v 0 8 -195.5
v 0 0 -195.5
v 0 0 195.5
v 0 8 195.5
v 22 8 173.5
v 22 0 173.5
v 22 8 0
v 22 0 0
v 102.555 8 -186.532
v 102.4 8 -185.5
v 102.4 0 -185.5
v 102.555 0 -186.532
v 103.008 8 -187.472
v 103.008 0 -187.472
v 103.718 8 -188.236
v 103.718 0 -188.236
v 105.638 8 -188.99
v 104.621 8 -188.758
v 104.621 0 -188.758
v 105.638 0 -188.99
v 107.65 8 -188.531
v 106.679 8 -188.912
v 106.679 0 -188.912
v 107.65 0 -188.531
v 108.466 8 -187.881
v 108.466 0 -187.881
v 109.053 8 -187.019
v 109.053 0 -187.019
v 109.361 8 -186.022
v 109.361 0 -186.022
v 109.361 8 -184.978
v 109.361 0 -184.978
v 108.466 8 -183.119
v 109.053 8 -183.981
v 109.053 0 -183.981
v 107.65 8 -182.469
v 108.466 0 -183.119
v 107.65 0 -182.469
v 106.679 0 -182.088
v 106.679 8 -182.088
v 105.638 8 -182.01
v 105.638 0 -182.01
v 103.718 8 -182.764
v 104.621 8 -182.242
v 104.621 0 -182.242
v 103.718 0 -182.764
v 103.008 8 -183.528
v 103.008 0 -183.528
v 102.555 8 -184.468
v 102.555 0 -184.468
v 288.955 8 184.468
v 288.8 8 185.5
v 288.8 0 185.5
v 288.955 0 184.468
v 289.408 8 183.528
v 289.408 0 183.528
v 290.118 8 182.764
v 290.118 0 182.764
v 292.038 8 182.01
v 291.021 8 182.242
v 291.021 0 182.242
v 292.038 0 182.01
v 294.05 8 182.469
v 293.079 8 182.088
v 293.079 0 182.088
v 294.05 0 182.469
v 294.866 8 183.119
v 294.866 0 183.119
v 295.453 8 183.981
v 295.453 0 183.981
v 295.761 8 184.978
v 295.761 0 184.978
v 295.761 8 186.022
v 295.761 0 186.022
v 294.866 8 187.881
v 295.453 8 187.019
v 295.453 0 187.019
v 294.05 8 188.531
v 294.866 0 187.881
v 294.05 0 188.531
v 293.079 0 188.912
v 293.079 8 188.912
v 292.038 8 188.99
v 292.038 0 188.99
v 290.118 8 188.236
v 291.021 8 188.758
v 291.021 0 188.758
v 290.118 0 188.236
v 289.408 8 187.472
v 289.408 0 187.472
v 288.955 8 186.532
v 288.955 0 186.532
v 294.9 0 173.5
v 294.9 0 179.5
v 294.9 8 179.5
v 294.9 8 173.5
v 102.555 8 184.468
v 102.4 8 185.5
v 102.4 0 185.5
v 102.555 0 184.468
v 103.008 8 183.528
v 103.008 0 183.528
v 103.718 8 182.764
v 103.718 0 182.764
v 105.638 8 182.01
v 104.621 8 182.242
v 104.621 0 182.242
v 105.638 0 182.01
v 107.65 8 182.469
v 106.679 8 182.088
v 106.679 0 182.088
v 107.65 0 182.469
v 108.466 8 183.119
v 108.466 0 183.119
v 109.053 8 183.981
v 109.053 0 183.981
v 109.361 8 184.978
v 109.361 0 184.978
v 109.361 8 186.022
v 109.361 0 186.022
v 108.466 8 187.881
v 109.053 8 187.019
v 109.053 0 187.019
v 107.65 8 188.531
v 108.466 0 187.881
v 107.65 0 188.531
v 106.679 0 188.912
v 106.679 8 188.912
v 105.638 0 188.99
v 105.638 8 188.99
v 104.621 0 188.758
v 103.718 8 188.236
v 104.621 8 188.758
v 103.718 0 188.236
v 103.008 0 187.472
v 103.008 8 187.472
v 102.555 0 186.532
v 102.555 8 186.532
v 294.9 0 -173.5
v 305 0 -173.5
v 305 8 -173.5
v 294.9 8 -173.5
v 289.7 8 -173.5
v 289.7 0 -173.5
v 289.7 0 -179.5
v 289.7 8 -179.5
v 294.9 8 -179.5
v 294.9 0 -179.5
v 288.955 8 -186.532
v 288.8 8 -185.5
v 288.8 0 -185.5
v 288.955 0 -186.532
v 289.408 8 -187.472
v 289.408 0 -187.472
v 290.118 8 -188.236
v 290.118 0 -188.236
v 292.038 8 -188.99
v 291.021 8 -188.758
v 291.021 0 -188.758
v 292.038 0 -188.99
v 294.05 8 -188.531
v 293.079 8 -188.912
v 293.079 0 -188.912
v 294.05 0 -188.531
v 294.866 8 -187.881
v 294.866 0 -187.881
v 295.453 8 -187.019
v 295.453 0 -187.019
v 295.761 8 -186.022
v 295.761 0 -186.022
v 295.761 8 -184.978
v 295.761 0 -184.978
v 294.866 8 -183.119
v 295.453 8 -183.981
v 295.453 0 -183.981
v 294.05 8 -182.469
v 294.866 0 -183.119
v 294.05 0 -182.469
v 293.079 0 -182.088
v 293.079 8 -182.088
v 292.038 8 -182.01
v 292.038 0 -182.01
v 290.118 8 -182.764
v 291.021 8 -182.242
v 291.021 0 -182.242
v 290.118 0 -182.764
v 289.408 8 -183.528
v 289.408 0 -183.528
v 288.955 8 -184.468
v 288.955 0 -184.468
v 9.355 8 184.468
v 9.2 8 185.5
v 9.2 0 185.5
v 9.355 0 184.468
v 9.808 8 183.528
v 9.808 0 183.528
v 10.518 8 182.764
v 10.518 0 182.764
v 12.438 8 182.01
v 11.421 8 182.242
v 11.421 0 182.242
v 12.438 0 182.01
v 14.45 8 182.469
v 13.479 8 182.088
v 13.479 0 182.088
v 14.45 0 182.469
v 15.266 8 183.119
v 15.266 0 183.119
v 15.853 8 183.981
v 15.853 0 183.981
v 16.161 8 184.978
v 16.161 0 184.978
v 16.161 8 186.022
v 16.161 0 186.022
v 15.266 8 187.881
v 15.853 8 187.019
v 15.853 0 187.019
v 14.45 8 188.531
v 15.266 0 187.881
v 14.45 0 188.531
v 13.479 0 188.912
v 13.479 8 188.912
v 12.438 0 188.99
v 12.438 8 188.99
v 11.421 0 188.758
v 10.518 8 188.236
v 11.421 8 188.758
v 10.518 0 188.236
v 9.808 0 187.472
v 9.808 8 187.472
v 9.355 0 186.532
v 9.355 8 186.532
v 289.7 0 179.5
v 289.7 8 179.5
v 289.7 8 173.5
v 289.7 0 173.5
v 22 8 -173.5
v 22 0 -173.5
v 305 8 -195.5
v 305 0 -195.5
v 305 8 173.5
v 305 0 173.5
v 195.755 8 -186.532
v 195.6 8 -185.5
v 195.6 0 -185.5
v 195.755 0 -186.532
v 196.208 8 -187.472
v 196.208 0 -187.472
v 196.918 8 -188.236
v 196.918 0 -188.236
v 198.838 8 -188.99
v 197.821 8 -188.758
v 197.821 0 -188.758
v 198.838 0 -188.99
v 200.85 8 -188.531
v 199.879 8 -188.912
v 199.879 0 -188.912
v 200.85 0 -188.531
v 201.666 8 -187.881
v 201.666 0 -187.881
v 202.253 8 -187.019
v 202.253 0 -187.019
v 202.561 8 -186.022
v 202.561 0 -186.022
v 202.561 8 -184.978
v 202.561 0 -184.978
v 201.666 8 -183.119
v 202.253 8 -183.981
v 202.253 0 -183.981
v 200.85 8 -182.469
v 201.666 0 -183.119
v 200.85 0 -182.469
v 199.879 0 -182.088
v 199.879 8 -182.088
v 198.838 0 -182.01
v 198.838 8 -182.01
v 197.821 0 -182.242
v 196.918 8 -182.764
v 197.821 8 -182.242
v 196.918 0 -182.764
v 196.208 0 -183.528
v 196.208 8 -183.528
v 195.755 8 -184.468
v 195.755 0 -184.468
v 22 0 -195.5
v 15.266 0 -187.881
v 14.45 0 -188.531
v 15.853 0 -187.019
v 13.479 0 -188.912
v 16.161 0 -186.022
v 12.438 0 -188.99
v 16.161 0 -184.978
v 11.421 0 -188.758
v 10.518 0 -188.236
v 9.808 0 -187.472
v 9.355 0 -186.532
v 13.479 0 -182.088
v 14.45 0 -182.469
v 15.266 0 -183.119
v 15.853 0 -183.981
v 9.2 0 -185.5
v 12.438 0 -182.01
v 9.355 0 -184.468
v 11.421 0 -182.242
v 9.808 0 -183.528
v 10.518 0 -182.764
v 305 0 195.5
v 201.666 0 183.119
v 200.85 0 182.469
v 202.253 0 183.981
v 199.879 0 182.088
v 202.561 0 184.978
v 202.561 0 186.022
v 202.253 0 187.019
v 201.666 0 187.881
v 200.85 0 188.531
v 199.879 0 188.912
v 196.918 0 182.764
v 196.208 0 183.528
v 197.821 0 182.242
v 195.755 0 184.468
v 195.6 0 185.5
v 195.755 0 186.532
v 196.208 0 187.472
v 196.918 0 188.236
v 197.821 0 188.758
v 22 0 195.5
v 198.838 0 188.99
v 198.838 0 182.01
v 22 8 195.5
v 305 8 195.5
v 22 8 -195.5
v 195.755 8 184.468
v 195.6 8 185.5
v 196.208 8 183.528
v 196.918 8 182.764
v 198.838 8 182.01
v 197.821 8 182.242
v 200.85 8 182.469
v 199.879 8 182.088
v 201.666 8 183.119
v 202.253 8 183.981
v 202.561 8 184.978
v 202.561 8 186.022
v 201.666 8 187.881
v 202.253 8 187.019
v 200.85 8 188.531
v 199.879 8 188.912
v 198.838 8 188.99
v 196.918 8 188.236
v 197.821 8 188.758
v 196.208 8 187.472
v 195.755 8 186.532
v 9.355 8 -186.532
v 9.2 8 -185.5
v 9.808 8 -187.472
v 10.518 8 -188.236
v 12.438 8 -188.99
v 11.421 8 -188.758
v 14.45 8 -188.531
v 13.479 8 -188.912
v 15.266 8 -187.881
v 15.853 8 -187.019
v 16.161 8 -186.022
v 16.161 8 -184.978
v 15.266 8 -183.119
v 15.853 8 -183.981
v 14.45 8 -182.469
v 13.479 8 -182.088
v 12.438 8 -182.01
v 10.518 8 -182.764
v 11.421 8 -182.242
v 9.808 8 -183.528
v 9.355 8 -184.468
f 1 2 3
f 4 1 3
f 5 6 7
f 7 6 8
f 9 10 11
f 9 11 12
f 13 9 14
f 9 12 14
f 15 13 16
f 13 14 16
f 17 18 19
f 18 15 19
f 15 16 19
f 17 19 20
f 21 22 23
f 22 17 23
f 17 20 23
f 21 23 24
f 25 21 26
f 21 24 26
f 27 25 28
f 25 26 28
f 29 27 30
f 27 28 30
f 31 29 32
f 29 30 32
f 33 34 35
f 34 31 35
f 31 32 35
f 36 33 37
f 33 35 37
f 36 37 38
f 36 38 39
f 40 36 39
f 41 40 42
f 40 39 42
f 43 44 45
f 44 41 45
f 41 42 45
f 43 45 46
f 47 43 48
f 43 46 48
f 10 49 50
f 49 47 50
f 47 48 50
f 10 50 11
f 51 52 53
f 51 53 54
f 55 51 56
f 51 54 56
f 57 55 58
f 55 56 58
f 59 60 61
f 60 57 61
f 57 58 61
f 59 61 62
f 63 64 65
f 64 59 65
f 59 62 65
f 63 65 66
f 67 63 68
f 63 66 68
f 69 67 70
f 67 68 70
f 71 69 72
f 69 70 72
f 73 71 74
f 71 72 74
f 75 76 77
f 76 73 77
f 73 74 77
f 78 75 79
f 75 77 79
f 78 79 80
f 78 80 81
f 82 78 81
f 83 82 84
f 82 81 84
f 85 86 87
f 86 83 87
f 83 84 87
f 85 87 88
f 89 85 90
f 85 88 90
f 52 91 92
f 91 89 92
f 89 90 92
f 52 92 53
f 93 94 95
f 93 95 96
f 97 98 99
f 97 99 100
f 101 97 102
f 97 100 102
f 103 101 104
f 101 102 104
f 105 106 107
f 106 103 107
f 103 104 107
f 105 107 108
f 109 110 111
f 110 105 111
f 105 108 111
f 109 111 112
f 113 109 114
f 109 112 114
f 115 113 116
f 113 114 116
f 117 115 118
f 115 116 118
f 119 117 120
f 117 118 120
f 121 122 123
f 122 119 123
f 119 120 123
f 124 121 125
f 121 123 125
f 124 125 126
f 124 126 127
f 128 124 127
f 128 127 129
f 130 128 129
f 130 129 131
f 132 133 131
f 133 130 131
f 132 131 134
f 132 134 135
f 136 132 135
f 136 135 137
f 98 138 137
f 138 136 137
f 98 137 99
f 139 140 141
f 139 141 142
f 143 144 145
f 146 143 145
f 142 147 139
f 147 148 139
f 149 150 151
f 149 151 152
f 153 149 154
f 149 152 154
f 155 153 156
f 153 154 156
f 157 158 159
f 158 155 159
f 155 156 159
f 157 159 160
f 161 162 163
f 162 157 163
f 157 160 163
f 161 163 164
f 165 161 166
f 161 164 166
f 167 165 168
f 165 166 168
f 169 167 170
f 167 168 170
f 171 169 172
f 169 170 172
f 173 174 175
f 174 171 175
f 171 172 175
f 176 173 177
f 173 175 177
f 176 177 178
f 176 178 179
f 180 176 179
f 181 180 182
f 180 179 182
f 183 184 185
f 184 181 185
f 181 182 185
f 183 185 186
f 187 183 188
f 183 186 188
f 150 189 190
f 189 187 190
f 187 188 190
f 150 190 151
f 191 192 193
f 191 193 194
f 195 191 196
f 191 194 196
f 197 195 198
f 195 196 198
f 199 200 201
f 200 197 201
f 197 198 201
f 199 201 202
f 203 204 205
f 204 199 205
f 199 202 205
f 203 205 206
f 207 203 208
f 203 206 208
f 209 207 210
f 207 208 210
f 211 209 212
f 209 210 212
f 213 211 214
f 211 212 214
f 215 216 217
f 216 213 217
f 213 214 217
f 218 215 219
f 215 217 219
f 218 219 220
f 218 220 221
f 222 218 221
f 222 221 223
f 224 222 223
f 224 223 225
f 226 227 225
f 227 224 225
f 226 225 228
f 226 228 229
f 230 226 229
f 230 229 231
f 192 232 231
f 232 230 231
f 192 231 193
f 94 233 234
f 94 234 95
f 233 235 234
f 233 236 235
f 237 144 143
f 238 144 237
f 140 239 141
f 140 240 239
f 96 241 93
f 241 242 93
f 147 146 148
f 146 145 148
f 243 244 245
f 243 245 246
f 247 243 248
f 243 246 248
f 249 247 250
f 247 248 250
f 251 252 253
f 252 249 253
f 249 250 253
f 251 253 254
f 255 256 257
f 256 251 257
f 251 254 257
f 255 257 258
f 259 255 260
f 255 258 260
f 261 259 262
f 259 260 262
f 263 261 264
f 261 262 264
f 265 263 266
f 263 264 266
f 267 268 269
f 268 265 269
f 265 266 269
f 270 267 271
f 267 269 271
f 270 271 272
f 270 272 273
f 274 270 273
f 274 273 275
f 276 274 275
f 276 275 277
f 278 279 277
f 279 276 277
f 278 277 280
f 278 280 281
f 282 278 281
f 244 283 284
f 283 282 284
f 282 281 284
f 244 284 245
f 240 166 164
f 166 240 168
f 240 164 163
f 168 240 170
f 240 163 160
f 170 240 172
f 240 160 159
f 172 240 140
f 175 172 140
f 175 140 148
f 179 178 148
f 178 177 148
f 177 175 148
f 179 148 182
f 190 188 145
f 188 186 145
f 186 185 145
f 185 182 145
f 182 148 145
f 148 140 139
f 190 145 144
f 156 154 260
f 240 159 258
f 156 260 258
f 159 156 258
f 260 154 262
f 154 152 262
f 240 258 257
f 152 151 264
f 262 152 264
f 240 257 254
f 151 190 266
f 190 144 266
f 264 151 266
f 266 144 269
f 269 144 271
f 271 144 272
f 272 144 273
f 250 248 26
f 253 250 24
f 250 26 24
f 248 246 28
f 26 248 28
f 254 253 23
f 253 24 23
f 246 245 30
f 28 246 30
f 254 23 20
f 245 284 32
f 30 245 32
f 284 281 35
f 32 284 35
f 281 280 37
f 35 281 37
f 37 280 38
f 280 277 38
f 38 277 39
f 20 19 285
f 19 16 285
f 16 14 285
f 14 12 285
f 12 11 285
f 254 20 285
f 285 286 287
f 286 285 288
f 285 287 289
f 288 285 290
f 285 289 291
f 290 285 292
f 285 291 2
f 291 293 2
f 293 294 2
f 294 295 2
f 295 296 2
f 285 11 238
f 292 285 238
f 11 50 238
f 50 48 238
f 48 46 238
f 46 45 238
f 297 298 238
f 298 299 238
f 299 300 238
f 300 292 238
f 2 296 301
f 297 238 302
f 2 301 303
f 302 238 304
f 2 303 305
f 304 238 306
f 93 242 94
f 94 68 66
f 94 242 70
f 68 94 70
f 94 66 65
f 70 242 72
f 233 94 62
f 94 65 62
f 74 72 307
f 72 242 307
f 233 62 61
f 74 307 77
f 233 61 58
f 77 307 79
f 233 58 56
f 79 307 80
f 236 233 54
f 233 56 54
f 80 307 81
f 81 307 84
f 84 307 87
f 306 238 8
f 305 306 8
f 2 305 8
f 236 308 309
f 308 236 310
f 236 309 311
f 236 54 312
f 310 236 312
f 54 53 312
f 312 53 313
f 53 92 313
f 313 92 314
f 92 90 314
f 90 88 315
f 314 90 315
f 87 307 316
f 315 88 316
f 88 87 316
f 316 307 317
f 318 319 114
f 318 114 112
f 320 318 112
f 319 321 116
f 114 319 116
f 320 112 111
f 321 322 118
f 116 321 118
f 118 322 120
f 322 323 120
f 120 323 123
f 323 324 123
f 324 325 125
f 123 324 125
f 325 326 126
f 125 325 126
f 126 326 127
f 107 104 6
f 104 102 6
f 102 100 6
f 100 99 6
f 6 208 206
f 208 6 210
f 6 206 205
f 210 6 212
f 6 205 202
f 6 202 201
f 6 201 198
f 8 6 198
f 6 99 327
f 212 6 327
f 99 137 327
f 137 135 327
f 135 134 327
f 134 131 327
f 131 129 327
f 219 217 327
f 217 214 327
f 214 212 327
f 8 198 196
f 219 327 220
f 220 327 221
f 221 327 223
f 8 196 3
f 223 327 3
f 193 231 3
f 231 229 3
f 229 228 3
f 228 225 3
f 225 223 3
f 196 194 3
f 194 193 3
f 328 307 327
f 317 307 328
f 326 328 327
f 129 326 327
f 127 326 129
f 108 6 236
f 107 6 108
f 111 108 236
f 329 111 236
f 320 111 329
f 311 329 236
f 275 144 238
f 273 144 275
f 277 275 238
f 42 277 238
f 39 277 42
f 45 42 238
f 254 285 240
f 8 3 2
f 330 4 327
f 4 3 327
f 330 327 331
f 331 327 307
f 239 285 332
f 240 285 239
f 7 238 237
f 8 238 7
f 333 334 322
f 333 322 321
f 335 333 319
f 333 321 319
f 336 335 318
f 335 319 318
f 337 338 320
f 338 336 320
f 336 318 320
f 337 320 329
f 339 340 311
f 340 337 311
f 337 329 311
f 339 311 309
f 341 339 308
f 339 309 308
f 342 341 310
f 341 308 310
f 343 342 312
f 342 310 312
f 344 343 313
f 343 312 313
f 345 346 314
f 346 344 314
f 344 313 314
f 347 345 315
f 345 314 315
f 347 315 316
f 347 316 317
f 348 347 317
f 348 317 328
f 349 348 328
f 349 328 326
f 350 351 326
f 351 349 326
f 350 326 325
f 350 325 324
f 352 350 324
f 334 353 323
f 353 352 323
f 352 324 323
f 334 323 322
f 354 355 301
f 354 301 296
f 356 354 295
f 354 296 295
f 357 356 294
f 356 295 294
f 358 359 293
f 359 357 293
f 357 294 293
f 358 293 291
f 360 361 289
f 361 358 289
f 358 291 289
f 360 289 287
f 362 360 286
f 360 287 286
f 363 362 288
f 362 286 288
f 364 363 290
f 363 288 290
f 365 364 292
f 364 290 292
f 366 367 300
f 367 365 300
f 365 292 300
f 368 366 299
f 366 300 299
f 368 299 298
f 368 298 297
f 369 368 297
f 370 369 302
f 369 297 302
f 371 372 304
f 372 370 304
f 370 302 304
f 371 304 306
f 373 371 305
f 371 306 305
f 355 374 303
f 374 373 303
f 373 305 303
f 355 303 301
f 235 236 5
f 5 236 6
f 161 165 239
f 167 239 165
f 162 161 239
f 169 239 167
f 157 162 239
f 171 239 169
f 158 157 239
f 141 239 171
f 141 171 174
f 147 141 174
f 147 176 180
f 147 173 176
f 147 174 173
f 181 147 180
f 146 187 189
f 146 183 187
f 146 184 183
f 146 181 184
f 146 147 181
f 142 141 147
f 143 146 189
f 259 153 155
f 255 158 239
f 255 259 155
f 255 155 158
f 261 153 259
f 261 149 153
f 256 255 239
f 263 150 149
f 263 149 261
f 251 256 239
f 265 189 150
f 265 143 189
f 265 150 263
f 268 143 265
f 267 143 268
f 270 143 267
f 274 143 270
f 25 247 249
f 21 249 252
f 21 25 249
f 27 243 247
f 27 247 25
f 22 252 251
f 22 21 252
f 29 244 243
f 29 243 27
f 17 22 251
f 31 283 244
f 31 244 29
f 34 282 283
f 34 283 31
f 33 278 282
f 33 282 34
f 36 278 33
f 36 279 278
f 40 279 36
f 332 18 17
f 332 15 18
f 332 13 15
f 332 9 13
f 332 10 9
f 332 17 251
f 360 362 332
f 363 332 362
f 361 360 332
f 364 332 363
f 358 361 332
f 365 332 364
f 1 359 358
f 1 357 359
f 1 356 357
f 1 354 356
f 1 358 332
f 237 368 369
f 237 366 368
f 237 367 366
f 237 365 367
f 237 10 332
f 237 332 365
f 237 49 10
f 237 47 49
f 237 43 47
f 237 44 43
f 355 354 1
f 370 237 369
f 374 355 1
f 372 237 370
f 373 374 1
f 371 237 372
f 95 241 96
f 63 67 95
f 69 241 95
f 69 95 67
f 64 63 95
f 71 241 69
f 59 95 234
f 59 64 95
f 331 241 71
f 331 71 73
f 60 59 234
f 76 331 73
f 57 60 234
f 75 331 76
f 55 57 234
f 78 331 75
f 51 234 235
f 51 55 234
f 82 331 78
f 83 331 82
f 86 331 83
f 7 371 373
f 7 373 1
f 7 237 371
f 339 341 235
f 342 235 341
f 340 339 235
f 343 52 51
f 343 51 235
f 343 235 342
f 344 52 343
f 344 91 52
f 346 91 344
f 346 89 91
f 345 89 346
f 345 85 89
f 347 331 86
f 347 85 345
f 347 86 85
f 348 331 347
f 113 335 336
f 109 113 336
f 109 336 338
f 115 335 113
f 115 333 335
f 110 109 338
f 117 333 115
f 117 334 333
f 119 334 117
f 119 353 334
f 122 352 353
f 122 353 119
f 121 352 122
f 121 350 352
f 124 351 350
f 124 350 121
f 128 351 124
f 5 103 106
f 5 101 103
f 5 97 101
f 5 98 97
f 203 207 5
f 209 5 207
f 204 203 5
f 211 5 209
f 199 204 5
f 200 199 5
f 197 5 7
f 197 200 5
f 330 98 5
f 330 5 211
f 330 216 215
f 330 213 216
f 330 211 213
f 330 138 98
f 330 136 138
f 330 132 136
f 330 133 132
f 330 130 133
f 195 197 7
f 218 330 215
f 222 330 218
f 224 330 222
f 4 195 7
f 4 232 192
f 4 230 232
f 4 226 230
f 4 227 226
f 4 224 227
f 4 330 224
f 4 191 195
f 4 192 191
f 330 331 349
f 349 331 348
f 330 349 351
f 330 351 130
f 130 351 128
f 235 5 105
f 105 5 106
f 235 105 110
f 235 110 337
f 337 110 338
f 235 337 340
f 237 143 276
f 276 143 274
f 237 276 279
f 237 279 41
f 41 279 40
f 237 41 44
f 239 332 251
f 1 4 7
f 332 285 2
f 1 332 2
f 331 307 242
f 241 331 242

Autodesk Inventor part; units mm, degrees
ref_plane "YZ Plane" through (0, 0, 0) normal (1, 0, 0) x (0, 1, 0)
ref_plane "XZ Plane" through (0, 0, 0) normal (0, 1, 0) x (-1, 0, 0)
ref_plane "XY Plane" through (0, 0, 0) normal (0, 0, 1) x (1, 0, 0)
sketch "Sketch2" plane through (0, 0, 0) normal (0, 1, 0) x (-1, 0, 0)
  line L0 (0, 195.5) -> (-22, 195.5)
  line L1 (-22, -195.5) -> (0, -195.5)
  line L2 (0, -195.5) -> (0, 195.5)
  line L3 (-22, 195.5) -> (-305, 195.5)
  line L4 (-305, 195.5) -> (-305, 173.5)
  line L5 (-305, 173.5) -> (-22, 173.5)
  line L6 (-22, -195.5) -> (-305, -195.5)
  line L7 (-305, -195.5) -> (-305, -173.5)
  line L8 (-305, -173.5) -> (-22, -173.5)
  circle A0 centre (-292.3, 185.5) radius 3.5
  line L9 (-292.3, 185.5) -> (-292.3, 173.5) construction
  line L10 (-289.7, 179.5) -> (-294.9, 179.5)
  line L11 (-294.9, 179.5) -> (-294.9, 173.5)
  line L12 (-294.9, 173.5) -> (-289.7, 173.5)
  line L13 (-289.7, 173.5) -> (-289.7, 179.5)
  circle A1 centre (-199.1, 185.5) radius 3.5
  circle A2 centre (-105.9, 185.5) radius 3.5
  circle A3 centre (-12.7, 185.5) radius 3.5
  line L14 (-22, 195.5) -> (-22, 173.5) construction
  line L15 (0, 0) -> (337.7885, 0) construction
  line L16 (0, 0) -> (-365.548, 0) construction
  line L17 (-22, 173.5) -> (-22, 0)
  line L18 (-22, -173.5) -> (-22, 0)
  circle A4 centre (-292.3, -185.5) radius 3.5
  line L19 (-289.7, -179.5) -> (-294.9, -179.5)
  line L20 (-294.9, -179.5) -> (-294.9, -173.5)
  line L21 (-289.7, -173.5) -> (-289.7, -179.5)
  circle A5 centre (-199.1, -185.5) radius 3.5
  circle A6 centre (-105.9, -185.5) radius 3.5
  circle A7 centre (-12.7, -185.5) radius 3.5
  line L22 (-294.9, -173.5) -> (-289.7, -173.5)
  dimension "d0" = 22
  dimension "d1" = 22
  dimension "d2" = 22
  dimension "d6" = 347
  dimension "d7" = 7
  dimension "d9" = 12.7
  dimension "d10" = 10
  dimension "d11" = 5.2
  dimension "d12" = 6
  dimension "d15" = 93.2
  dimension "d22" = 185.5
  dimension "d23" = 22
  dimension "d24" = 305
  dimension "d29" = 305
extrude "Extrusion2" add sketch "Sketch2" along normal blind 8 contours L2 L1 L6 L7 L8 L20 L19 L21 L18 L17 L5 L13 L10 L11 L4 L3 L0
equation "\"d1\" = d0"
equation "\"d2\" = d0"
equation "\"d15\" = -0.666667 * d9 + 0.333333 * d24"
equation "\"d23\" = d0"
equation "\"d29\" = d24"
properties part number "Top stabiliser"
